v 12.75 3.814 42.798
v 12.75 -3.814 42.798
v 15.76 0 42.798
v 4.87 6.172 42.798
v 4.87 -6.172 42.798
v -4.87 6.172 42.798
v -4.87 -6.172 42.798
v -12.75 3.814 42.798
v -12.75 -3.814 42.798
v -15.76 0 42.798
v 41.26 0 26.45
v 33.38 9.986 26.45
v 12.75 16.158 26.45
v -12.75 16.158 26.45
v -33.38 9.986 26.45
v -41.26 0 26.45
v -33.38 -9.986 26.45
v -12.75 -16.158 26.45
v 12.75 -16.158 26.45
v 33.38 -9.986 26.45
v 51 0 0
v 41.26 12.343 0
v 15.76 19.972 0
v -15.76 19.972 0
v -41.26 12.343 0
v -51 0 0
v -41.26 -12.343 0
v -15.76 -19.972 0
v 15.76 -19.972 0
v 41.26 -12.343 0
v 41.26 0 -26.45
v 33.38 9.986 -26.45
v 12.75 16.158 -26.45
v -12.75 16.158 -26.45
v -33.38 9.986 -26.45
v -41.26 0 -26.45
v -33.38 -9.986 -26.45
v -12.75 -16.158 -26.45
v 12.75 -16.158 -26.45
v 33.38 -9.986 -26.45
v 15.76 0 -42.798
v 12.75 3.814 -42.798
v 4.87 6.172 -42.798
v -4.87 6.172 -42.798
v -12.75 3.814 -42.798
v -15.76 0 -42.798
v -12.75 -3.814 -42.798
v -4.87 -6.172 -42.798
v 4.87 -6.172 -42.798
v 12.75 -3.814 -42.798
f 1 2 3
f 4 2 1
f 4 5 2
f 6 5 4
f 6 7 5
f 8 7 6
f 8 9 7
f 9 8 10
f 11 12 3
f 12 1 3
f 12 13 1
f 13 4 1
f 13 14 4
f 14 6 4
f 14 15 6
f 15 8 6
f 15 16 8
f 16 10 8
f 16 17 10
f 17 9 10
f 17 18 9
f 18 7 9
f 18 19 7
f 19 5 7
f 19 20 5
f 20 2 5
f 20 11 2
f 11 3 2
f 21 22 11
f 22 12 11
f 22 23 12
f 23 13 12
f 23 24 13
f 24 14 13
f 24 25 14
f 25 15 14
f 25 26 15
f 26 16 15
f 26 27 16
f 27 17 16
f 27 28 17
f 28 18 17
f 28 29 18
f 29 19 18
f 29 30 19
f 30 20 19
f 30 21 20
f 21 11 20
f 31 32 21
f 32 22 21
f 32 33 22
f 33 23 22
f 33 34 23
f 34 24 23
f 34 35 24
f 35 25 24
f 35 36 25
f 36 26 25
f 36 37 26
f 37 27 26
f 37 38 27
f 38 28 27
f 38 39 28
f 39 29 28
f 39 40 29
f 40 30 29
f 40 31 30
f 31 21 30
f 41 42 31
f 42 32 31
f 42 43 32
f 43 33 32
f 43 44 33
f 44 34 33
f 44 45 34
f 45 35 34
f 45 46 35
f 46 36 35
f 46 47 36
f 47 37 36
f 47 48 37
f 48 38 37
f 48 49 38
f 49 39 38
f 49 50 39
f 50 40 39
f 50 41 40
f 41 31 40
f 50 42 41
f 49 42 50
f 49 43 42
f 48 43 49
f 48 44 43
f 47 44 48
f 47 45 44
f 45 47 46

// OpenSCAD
// Generated by SolidPython 1.0.1 on 2020-07-29 00:46:52


scale(v = [17, 7, 15]) {
	sphere(r = 3);
}
/***********************************************
*********      SolidPython code:      **********
************************************************
 
# import packages: SolidPython
from solid import *
from solid.utils import *
from itertools import chain, combinations, permutations


class Resize:

    def __init__(self, scad_file):
        self.scad_file = scad_file
        #self.scad_file = import_scad(scad_file)
        # cone/cylinder param:
        self.r1 = 0
        self.r2 = 0
        self.h = 0
        # rectangular prism param:
        self.w = 0
        self.l = 0
        # ellipse param:
        self.r = 0

    # import OpenScad code (file name corresponds to shape)


    # classify shape + parameters
    def assign(self, param1, param2, param3):
        if self.scad_file == 'cone.scad':
            self.r1 = param1
            self.r2 = param2
            self.h = param3
        elif self.scad_file == 'cylinder.scad':
            self.r1 = param1
            self.r2 = param2
            self.h = param3
        elif self.scad_file == 'rectangularPrism.scad':
            self.h = param1
            self.l = param2
            self.w = param3
        else:
            self.r = param1
            self.h = param2

    # resize parameters
    def iterate(self):
        x = range(3, 20, 2)
        i = 1
        if self.scad_file == 'cone.scad':
            tempList = list(permutations(x, 2))
            for temp in tempList:
                param1 = temp[0]
                param2 = temp[1]
                filepath = 'produced_scad_files/' + 'cone' + str(param1) + '_' + str(param2) + '_' + '.scad'
                scad_render_to_file(cylinder(h=param1, r1=param2, r2=0), filepath)

        elif self.scad_file == 'cylinder.scad':
            tempList = list(permutations(x, 3))
            for temp in tempList:
                param1 = temp[0]
                param2 = temp[1]
                filepath = 'produced_scad_files/' + 'cylinder' + str(param1) + '_' + str(param2) + '_' + '.scad'
                scad_render_to_file(cylinder(h=param1, r1=param2, r2=param2), filepath)

        elif self.scad_file == 'rectangularPrism.scad':
            tempList = list(permutations(x, 3))
            for temp in tempList:
                param1 = temp[0]
                param2 = temp[1]
                param3 = temp[2]
                filepath = 'produced_scad_files/' + 'rectangularPrism' + str(param1) + '_' + str(param2) + '_' + str(
                    param3) + '.scad'
                scad_render_to_file(cube(size=(param1, param2, param3)), filepath)

        elif self.scad_file == 'ellipse.scad':
            tempList = list(permutations(x, 4))
            for temp in tempList:
                param1 = temp[0]
                param2 = temp[1]
                param3 = temp[2]
                param4 = temp[3]
                filepath = 'produced_scad_files/' + 'ellipse' + str(param1) + '_' + str(param2) + '_' + str(param3) + '_' + str(param4) + '.scad'
                scad_render_to_file(scale([param1, param2, param3])(sphere(r=param4)), filepath)

    def render_to_scadfile(self):
        scad_render_to_file(scad, 'example.scad') 
 
************************************************/
